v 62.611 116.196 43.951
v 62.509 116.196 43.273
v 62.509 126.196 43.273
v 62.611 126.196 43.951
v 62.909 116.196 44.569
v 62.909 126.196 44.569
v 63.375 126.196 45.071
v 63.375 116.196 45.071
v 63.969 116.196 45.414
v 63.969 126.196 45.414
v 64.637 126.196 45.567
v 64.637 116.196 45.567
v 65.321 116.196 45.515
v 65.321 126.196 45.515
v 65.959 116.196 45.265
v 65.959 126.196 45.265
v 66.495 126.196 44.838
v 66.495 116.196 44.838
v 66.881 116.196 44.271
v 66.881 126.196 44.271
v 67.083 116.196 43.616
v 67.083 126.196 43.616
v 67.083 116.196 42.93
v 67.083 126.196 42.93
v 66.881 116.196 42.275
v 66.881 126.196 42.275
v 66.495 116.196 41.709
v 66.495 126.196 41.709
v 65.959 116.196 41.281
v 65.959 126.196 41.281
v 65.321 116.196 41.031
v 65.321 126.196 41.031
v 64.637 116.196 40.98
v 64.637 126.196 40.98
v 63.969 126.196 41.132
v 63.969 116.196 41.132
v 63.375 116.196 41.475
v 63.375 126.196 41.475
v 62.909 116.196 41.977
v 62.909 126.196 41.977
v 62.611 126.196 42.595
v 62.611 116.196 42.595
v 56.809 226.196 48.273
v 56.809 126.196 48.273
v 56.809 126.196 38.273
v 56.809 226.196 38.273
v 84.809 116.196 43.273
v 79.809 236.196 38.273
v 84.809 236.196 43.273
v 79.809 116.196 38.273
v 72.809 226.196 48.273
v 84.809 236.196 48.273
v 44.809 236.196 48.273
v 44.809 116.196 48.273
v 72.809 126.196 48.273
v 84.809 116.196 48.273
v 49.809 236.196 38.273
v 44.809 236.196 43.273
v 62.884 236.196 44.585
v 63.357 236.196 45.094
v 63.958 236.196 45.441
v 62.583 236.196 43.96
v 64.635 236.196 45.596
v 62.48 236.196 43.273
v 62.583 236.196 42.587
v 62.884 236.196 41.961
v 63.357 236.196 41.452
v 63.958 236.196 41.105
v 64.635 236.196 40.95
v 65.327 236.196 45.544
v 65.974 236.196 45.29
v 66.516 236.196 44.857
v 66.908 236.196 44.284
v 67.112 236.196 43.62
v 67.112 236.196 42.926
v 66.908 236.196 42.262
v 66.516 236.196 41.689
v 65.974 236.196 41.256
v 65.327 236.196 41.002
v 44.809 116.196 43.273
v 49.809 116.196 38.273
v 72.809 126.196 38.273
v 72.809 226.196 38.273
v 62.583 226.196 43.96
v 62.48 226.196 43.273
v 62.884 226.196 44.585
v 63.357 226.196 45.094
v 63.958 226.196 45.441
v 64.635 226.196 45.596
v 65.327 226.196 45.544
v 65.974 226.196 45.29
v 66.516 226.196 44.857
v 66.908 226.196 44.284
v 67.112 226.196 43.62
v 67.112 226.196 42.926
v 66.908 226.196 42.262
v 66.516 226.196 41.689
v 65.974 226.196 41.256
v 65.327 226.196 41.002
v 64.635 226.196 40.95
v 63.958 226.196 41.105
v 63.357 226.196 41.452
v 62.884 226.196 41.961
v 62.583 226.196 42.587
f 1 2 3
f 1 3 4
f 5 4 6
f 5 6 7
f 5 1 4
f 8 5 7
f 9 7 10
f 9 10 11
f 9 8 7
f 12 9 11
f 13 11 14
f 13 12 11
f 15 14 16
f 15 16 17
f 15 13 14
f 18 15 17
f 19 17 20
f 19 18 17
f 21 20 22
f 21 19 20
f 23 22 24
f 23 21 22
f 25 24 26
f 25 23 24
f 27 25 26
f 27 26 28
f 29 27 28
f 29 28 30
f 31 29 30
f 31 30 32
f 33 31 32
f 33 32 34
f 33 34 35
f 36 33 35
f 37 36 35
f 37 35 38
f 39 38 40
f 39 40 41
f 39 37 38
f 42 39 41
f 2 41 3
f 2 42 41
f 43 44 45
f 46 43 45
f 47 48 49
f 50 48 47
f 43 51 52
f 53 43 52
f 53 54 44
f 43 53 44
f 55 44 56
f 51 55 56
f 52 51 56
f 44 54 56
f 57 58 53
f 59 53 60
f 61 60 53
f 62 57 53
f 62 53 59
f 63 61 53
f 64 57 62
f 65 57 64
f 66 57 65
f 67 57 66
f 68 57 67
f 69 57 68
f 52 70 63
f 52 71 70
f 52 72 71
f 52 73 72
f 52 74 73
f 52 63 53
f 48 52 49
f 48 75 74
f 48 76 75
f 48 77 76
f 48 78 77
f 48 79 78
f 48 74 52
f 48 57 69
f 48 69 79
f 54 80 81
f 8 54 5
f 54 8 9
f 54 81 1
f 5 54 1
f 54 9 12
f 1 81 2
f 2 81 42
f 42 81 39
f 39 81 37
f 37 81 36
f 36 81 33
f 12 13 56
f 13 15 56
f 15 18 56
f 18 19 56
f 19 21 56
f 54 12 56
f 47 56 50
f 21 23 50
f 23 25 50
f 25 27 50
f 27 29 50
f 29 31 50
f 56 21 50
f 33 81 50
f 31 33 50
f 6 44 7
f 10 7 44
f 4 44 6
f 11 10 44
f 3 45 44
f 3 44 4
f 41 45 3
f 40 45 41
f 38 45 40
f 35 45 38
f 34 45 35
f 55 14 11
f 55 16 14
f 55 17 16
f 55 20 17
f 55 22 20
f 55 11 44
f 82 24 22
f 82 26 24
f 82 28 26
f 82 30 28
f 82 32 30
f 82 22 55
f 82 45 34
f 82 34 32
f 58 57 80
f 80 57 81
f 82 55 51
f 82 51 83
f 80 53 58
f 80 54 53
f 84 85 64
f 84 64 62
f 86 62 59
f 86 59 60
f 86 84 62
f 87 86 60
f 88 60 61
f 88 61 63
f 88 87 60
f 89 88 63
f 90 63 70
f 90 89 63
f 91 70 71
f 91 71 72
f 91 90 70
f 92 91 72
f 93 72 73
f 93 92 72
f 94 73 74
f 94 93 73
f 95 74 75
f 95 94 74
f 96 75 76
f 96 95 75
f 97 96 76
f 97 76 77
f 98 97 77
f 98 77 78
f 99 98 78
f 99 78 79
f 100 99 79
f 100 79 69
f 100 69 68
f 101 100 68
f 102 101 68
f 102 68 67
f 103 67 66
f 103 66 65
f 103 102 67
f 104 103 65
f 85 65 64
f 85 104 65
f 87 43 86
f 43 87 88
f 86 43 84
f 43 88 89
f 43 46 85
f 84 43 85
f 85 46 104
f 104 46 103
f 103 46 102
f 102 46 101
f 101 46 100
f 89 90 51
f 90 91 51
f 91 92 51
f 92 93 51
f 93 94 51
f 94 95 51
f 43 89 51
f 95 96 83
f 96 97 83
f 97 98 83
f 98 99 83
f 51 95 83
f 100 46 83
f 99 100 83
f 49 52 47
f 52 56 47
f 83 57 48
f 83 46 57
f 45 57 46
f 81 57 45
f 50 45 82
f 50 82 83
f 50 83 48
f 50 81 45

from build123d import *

# Parameters (mm, degrees)
SKETCH_1_W      = 40
SKETCH_1_H      = 10
SKETCH_1_R      = 2.3
EXTRUDE_1_DEPTH = 10
SKETCH_2_W      = 12
SKETCH_2_H      = 10
EXTRUDE_3_DEPTH = 100
SKETCH_3_W      = 40
SKETCH_3_H      = 10
SKETCH_3_R      = 2.329290182
EXTRUDE_4_DEPTH = 10
CHAMFER_1_SIZE  = 5


with BuildPart() as part:
    # Эскиз1 → Бобышка-Вытянуть1 (new body)
    with BuildSketch(Plane(origin=(0, 116.195974268, 0), x_dir=(1, 0, 0), z_dir=(0, 1, 0))):
        with Locations((64.808980694, -43.273129836)):
            Rectangle(SKETCH_1_W, SKETCH_1_H)
        with Locations(Location((64.808980694, -43.273129836, 0), (0, 0, 180))):
            Circle(SKETCH_1_R, mode=Mode.SUBTRACT)
    extrude(amount=EXTRUDE_1_DEPTH)

    # Эскиз2 → Бобышка-Вытянуть3 (add)
    with BuildSketch(Plane(origin=(0, 126.195974268, 0), x_dir=(1, 0, 0), z_dir=(0, 1, 0))):
        with Locations((50.808980694, -43.273129836)):
            Rectangle(SKETCH_2_W, SKETCH_2_H)
        with Locations((78.808980694, -43.273129836)):
            Rectangle(SKETCH_2_W, SKETCH_2_H)
    extrude(amount=EXTRUDE_3_DEPTH)

    # Эскиз3 → Бобышка-Вытянуть4 (add)
    with BuildSketch(Plane(origin=(0, 226.195974268, 0), x_dir=(1, 0, 0), z_dir=(0, 1, 0))):
        with Locations((64.808980694, -43.273129836)):
            Rectangle(SKETCH_3_W, SKETCH_3_H)
        with Locations(Location((64.808980694, -43.273129836, 0), (0, 0, 180))):
            Circle(SKETCH_3_R, mode=Mode.SUBTRACT)
    extrude(amount=EXTRUDE_4_DEPTH)

    # Фаска1
    chamfer_1_edges = [part.edges().sort_by_distance(p)[0] for p in [
        (44.808980694, 176.195974268, 38.273129836),
        (84.808980694, 176.195974268, 38.273129836),
    ]]
    chamfer(chamfer_1_edges, length=CHAMFER_1_SIZE)


solid = part.part
